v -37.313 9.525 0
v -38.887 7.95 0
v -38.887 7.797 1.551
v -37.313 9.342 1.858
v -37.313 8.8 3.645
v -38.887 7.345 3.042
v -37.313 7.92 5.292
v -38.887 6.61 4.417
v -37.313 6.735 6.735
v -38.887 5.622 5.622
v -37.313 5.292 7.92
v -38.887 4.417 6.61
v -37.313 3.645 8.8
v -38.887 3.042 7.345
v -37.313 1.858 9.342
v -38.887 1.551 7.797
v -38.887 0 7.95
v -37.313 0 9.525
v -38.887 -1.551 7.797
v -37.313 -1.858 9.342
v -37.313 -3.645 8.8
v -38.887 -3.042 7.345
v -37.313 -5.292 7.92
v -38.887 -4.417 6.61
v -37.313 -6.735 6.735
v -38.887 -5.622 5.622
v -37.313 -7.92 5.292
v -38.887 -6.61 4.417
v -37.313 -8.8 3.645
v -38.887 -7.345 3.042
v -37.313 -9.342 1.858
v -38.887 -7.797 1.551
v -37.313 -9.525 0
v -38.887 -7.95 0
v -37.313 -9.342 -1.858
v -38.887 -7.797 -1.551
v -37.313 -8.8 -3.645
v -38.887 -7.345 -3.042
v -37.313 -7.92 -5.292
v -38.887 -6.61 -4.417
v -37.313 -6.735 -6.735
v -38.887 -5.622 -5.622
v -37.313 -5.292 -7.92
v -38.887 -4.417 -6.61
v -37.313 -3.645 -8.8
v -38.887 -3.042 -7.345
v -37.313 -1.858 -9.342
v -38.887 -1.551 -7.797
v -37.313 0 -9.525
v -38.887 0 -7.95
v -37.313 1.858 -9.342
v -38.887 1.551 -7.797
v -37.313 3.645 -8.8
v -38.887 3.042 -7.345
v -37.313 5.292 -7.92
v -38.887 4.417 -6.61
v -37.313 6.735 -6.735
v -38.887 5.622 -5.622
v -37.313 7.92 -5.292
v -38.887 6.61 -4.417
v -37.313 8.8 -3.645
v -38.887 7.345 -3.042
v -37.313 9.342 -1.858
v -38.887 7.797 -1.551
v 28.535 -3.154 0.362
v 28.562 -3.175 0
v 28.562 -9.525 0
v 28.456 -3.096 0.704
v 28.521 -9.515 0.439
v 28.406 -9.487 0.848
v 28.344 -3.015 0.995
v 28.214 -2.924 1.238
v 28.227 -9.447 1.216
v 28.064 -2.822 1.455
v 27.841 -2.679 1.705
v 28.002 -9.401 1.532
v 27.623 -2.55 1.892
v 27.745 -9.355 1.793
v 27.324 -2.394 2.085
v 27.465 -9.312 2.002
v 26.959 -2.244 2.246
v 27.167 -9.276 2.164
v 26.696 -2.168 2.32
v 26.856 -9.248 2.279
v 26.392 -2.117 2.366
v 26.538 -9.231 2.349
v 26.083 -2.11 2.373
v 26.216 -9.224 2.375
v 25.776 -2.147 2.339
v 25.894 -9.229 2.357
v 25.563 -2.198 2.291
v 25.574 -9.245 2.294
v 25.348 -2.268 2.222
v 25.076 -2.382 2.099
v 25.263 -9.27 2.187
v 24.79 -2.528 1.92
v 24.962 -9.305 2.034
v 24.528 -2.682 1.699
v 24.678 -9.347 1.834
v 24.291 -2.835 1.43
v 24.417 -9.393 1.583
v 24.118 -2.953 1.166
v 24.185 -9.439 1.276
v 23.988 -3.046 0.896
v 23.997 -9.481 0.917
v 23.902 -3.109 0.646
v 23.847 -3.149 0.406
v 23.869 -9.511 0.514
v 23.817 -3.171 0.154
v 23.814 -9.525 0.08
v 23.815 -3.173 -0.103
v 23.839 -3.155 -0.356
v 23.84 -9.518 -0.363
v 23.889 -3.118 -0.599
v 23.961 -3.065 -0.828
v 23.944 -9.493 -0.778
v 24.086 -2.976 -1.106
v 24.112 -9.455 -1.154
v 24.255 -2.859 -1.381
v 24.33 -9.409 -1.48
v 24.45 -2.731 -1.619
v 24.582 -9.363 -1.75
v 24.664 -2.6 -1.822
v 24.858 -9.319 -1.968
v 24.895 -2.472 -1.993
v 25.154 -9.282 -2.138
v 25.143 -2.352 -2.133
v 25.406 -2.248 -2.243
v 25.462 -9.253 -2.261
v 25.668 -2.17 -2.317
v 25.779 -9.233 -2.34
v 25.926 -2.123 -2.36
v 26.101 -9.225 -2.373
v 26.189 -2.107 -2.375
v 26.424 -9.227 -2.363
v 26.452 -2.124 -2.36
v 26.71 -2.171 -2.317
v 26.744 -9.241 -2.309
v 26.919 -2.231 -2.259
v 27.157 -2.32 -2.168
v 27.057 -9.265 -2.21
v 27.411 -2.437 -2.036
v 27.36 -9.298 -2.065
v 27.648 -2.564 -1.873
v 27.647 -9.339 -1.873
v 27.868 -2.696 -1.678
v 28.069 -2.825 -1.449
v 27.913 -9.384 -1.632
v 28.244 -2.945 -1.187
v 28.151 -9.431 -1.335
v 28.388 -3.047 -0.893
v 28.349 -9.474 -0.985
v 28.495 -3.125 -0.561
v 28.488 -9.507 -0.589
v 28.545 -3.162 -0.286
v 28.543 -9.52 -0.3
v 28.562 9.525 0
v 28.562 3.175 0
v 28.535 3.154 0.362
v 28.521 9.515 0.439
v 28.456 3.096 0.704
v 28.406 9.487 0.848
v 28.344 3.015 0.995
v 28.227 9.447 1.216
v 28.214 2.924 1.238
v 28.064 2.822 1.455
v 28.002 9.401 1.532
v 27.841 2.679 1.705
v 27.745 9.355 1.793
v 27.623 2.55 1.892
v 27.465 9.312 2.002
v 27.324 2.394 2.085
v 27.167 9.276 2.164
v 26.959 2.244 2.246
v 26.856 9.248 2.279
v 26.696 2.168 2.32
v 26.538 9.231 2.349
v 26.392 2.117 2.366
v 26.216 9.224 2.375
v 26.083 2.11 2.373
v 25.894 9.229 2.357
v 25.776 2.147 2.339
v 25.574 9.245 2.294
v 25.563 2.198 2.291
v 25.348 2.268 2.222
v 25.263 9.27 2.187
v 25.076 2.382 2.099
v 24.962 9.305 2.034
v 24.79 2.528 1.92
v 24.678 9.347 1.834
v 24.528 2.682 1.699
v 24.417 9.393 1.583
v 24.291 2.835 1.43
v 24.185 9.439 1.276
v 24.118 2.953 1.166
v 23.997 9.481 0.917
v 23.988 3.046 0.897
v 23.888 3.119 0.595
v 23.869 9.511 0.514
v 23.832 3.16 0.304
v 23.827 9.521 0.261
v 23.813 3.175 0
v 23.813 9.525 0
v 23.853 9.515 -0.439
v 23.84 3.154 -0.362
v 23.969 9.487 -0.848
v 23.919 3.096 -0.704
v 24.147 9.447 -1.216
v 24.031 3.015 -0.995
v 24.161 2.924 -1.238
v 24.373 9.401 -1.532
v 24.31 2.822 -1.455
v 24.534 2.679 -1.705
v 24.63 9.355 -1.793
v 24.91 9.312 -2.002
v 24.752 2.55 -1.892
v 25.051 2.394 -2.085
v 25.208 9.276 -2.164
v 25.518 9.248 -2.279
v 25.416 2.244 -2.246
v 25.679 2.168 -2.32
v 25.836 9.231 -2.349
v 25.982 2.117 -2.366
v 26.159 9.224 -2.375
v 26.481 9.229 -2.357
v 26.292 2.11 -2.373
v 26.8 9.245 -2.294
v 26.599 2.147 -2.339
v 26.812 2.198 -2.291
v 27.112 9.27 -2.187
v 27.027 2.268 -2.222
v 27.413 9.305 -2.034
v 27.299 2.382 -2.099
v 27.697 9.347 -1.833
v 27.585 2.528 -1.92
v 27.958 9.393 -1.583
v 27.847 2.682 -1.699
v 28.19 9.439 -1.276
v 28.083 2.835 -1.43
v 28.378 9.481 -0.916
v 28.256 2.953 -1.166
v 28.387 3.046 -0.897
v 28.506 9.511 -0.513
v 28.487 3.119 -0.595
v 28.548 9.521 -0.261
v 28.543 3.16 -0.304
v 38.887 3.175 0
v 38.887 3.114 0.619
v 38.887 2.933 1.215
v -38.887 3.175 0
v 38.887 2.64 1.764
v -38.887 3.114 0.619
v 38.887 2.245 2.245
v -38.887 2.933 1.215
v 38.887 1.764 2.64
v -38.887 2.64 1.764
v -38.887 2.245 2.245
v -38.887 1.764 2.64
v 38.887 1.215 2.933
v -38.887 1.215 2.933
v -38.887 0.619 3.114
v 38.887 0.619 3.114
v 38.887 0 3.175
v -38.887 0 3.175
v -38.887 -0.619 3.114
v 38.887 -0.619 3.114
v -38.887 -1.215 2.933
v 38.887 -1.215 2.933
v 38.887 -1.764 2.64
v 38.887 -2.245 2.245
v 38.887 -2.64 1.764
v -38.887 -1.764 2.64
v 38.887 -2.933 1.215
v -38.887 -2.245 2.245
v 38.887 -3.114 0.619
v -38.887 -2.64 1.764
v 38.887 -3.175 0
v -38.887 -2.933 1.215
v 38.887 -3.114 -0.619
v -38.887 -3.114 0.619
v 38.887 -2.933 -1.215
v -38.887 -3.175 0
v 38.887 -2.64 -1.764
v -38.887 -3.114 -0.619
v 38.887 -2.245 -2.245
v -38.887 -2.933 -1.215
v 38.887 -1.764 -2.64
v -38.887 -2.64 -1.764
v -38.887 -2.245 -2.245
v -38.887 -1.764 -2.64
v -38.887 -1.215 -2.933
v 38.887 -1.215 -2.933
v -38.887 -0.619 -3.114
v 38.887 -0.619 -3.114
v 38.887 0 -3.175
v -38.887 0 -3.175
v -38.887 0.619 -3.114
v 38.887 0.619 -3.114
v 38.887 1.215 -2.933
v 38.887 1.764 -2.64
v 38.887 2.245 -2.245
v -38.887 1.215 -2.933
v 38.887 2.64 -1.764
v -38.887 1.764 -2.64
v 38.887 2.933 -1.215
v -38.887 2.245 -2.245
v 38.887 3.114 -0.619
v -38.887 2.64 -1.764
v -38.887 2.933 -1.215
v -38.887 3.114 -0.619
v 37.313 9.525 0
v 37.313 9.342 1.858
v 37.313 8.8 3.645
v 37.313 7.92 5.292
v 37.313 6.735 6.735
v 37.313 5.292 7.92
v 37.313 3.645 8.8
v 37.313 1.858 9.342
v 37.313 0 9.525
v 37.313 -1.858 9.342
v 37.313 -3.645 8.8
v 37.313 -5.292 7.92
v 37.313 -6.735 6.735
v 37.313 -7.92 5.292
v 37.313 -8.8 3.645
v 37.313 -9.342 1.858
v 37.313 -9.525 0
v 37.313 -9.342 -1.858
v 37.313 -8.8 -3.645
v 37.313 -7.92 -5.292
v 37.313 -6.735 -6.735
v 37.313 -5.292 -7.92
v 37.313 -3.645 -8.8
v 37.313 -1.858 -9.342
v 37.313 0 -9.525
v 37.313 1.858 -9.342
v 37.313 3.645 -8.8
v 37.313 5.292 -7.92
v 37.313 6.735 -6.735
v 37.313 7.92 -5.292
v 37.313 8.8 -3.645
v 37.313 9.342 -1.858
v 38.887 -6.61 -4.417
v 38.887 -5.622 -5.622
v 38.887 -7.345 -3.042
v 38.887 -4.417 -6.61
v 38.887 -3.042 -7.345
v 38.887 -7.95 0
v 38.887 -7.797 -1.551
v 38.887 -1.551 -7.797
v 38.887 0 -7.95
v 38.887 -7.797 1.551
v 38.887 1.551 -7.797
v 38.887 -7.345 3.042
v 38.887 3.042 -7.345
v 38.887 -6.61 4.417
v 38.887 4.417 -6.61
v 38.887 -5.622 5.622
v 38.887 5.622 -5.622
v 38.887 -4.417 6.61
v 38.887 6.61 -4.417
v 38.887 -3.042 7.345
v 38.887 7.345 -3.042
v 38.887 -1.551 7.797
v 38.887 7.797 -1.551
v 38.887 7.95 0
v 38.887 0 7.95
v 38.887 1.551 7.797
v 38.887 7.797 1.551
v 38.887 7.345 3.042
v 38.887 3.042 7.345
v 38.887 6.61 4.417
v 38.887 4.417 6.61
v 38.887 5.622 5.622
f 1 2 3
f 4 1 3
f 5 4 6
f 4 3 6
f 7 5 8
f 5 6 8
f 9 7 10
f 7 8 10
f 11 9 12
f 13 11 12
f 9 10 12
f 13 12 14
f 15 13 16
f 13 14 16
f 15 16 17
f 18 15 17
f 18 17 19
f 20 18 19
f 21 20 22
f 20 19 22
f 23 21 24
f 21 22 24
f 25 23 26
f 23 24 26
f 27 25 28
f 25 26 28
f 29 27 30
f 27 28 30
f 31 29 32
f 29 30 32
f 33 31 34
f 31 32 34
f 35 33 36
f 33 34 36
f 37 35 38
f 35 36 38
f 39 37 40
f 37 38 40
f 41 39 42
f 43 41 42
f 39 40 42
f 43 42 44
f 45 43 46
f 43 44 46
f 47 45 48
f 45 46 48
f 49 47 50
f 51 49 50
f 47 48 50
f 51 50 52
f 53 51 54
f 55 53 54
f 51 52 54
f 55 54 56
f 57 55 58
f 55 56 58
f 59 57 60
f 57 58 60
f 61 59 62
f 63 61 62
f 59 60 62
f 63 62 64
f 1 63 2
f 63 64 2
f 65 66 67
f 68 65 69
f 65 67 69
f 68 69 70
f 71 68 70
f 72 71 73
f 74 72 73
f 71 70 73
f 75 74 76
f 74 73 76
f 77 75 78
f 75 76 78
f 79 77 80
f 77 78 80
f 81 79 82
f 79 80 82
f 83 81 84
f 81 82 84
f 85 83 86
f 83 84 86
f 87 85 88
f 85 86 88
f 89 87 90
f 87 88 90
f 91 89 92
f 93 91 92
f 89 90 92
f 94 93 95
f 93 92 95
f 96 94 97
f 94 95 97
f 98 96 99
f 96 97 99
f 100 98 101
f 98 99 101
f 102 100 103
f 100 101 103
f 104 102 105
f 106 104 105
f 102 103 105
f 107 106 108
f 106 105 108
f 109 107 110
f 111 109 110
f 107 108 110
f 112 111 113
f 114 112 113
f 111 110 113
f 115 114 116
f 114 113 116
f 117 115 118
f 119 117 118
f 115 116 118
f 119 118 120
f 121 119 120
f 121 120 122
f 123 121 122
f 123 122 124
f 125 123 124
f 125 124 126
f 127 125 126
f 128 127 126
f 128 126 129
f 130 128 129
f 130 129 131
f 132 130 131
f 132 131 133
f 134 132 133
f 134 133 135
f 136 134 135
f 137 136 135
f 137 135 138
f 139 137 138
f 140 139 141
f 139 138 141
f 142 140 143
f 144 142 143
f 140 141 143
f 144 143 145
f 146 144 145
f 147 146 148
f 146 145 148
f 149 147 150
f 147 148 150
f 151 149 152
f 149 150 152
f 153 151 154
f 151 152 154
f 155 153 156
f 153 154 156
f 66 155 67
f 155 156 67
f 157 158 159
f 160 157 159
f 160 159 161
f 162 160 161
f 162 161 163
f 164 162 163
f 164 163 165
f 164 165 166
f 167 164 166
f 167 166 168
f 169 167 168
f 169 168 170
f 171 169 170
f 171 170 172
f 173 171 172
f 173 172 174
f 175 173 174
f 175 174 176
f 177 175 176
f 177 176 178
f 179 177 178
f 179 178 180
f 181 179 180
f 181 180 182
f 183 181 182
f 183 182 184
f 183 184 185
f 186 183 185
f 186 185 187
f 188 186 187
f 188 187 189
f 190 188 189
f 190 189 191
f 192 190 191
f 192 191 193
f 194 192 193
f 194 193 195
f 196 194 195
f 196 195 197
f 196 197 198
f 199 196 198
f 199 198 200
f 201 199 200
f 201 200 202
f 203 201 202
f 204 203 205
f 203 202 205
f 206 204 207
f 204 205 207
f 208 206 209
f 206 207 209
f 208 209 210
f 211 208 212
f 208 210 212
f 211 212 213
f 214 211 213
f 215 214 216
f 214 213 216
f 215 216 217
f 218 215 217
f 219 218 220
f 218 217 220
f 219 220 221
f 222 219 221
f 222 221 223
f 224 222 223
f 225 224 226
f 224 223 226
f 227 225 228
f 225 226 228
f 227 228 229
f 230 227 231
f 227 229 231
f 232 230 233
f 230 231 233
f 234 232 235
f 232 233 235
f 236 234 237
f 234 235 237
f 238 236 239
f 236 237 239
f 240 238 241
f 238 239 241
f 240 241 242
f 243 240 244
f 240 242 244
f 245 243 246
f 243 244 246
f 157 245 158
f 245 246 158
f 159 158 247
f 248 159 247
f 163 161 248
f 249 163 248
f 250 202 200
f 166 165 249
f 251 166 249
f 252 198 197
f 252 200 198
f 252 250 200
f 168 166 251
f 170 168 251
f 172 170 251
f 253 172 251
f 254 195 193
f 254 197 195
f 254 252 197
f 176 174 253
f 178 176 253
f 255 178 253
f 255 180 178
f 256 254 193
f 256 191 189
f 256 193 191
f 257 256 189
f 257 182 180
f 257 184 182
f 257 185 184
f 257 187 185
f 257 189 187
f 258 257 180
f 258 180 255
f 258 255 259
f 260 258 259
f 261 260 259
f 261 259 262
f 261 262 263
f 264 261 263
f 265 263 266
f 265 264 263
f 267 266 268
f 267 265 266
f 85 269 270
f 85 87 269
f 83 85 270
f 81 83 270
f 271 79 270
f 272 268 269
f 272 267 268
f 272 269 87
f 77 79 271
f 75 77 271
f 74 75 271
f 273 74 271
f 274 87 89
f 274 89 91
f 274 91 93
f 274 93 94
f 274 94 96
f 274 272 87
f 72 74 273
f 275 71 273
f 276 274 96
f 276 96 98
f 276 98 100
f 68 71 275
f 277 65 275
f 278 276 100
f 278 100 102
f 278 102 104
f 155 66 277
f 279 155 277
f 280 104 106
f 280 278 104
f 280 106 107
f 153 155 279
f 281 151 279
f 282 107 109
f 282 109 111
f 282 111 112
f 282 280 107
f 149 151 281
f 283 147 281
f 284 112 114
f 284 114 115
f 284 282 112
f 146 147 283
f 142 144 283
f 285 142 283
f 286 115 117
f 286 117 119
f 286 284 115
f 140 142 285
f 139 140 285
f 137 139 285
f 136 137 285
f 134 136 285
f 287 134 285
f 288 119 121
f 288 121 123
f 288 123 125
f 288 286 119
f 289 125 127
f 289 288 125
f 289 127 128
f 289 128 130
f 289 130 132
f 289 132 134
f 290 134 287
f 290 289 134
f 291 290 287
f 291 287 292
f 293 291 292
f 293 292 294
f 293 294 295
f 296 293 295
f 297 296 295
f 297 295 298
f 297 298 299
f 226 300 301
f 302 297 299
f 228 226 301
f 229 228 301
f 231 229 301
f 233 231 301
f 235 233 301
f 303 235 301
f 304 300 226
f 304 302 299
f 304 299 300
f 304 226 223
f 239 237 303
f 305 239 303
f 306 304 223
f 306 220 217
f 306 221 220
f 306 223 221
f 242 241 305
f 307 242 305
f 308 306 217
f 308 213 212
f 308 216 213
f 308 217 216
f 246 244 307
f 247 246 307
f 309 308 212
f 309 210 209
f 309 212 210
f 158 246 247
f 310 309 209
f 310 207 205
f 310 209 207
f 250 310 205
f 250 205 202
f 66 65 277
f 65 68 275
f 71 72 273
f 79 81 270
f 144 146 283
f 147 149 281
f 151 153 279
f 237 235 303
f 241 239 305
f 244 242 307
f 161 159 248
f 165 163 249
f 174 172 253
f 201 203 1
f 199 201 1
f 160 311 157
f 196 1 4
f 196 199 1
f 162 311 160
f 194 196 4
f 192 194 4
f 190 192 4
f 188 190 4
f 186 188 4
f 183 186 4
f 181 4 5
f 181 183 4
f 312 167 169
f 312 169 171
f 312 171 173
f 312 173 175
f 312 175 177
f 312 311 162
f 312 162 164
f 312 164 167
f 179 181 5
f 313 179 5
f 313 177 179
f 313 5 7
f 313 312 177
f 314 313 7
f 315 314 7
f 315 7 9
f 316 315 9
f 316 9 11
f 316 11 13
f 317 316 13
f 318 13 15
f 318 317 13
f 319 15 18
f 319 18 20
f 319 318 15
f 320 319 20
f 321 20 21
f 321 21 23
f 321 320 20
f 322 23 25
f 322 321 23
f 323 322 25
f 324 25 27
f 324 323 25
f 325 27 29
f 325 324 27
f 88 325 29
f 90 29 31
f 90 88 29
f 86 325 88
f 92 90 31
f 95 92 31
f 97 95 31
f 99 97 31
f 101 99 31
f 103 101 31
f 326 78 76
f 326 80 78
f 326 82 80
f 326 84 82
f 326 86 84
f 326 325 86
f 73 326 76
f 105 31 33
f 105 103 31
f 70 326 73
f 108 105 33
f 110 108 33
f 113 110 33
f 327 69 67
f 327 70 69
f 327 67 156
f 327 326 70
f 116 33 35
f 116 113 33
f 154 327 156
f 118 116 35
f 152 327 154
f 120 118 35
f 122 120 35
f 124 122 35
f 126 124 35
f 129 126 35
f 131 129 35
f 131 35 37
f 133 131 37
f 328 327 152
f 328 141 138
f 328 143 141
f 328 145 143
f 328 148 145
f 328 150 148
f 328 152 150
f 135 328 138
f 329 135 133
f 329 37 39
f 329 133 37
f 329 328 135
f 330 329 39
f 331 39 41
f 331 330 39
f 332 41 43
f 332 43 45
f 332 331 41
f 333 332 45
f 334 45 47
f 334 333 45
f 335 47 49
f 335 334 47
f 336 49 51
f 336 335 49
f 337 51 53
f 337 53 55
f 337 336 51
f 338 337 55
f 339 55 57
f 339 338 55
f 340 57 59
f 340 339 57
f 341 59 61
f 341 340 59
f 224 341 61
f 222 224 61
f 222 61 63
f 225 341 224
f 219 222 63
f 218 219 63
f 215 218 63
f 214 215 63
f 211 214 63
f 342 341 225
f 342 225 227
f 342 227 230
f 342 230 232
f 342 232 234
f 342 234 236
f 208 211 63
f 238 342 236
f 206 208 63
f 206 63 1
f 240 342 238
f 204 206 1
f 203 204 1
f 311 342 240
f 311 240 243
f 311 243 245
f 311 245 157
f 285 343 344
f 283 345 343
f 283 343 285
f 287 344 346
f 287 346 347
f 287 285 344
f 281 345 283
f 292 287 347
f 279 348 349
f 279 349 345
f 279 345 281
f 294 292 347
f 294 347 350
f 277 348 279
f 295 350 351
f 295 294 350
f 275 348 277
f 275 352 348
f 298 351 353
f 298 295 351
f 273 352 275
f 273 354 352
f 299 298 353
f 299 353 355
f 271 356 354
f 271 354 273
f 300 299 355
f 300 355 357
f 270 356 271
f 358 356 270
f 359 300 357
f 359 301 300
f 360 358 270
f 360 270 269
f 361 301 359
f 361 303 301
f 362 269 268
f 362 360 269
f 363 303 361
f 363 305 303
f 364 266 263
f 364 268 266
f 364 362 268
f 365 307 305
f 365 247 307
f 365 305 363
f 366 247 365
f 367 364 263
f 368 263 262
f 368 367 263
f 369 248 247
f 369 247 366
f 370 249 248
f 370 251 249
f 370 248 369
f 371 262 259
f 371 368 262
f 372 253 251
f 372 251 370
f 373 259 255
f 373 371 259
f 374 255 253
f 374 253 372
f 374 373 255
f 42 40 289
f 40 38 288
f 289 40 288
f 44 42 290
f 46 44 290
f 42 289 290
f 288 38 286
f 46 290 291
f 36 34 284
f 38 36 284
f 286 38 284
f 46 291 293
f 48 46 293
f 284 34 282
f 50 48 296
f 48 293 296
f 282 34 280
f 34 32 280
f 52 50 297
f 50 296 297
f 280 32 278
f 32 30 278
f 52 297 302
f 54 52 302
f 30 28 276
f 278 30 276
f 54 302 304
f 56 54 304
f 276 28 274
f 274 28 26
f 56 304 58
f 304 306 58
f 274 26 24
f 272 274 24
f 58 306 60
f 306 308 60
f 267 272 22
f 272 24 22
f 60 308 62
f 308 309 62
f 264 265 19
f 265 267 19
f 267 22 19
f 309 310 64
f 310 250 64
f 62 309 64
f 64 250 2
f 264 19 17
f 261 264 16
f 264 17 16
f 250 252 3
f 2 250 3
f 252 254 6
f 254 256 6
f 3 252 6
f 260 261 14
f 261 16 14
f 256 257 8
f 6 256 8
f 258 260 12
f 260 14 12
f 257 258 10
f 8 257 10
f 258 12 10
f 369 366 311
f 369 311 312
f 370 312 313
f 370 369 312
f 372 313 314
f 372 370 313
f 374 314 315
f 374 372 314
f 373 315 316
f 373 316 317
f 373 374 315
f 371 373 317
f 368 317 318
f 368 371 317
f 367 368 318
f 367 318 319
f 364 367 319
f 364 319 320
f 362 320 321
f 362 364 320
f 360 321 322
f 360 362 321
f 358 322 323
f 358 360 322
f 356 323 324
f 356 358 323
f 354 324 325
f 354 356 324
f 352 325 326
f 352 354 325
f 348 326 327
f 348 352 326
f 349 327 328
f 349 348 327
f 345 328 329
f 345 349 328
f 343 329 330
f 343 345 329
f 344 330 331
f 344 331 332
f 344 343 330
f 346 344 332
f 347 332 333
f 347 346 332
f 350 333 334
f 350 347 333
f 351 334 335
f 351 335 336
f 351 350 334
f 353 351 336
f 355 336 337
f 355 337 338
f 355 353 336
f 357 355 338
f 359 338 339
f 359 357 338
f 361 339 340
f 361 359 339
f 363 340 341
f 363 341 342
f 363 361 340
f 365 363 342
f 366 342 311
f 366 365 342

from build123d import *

# Parameters (mm, degrees)
F0_R     = 9.525
F0_R_2   = 3.175
F1_DEPTH = 38.8874
F2_SIZE2 = 1.5748
F2_SIZE  = 1.5748
F3_SIZE2 = 1.5748
F3_SIZE  = 1.5748
F4_R     = 2.3749
F5_DEPTH = 12.7


with BuildPart() as f1:
    # F0 (on Right) → F1 (new body, symmetric)
    with BuildSketch(Plane.YZ):
        Circle(F0_R)
        Circle(F0_R_2, mode=Mode.SUBTRACT)
    extrude(amount=F1_DEPTH, both=True)

    # F2
    f2_edges = [f1.edges().sort_by_distance(p)[0] for p in [
        (38.8874, -9.525, 0),
    ]]
    chamfer(f2_edges, length=F2_SIZE, length2=F2_SIZE2)

    # F3
    f3_edges = [f1.edges().sort_by_distance(p)[0] for p in [
        (-38.8874, -9.525, 0),
    ]]
    chamfer(f3_edges, length=F3_SIZE, length2=F3_SIZE2)

    # F4 (on Front) → F5 (cut, symmetric)
    with BuildSketch(Plane.XZ):
        with Locations((26.1874, 0)):
            Circle(F4_R)
    extrude(amount=F5_DEPTH, both=True, mode=Mode.SUBTRACT)


solid = f1.part
